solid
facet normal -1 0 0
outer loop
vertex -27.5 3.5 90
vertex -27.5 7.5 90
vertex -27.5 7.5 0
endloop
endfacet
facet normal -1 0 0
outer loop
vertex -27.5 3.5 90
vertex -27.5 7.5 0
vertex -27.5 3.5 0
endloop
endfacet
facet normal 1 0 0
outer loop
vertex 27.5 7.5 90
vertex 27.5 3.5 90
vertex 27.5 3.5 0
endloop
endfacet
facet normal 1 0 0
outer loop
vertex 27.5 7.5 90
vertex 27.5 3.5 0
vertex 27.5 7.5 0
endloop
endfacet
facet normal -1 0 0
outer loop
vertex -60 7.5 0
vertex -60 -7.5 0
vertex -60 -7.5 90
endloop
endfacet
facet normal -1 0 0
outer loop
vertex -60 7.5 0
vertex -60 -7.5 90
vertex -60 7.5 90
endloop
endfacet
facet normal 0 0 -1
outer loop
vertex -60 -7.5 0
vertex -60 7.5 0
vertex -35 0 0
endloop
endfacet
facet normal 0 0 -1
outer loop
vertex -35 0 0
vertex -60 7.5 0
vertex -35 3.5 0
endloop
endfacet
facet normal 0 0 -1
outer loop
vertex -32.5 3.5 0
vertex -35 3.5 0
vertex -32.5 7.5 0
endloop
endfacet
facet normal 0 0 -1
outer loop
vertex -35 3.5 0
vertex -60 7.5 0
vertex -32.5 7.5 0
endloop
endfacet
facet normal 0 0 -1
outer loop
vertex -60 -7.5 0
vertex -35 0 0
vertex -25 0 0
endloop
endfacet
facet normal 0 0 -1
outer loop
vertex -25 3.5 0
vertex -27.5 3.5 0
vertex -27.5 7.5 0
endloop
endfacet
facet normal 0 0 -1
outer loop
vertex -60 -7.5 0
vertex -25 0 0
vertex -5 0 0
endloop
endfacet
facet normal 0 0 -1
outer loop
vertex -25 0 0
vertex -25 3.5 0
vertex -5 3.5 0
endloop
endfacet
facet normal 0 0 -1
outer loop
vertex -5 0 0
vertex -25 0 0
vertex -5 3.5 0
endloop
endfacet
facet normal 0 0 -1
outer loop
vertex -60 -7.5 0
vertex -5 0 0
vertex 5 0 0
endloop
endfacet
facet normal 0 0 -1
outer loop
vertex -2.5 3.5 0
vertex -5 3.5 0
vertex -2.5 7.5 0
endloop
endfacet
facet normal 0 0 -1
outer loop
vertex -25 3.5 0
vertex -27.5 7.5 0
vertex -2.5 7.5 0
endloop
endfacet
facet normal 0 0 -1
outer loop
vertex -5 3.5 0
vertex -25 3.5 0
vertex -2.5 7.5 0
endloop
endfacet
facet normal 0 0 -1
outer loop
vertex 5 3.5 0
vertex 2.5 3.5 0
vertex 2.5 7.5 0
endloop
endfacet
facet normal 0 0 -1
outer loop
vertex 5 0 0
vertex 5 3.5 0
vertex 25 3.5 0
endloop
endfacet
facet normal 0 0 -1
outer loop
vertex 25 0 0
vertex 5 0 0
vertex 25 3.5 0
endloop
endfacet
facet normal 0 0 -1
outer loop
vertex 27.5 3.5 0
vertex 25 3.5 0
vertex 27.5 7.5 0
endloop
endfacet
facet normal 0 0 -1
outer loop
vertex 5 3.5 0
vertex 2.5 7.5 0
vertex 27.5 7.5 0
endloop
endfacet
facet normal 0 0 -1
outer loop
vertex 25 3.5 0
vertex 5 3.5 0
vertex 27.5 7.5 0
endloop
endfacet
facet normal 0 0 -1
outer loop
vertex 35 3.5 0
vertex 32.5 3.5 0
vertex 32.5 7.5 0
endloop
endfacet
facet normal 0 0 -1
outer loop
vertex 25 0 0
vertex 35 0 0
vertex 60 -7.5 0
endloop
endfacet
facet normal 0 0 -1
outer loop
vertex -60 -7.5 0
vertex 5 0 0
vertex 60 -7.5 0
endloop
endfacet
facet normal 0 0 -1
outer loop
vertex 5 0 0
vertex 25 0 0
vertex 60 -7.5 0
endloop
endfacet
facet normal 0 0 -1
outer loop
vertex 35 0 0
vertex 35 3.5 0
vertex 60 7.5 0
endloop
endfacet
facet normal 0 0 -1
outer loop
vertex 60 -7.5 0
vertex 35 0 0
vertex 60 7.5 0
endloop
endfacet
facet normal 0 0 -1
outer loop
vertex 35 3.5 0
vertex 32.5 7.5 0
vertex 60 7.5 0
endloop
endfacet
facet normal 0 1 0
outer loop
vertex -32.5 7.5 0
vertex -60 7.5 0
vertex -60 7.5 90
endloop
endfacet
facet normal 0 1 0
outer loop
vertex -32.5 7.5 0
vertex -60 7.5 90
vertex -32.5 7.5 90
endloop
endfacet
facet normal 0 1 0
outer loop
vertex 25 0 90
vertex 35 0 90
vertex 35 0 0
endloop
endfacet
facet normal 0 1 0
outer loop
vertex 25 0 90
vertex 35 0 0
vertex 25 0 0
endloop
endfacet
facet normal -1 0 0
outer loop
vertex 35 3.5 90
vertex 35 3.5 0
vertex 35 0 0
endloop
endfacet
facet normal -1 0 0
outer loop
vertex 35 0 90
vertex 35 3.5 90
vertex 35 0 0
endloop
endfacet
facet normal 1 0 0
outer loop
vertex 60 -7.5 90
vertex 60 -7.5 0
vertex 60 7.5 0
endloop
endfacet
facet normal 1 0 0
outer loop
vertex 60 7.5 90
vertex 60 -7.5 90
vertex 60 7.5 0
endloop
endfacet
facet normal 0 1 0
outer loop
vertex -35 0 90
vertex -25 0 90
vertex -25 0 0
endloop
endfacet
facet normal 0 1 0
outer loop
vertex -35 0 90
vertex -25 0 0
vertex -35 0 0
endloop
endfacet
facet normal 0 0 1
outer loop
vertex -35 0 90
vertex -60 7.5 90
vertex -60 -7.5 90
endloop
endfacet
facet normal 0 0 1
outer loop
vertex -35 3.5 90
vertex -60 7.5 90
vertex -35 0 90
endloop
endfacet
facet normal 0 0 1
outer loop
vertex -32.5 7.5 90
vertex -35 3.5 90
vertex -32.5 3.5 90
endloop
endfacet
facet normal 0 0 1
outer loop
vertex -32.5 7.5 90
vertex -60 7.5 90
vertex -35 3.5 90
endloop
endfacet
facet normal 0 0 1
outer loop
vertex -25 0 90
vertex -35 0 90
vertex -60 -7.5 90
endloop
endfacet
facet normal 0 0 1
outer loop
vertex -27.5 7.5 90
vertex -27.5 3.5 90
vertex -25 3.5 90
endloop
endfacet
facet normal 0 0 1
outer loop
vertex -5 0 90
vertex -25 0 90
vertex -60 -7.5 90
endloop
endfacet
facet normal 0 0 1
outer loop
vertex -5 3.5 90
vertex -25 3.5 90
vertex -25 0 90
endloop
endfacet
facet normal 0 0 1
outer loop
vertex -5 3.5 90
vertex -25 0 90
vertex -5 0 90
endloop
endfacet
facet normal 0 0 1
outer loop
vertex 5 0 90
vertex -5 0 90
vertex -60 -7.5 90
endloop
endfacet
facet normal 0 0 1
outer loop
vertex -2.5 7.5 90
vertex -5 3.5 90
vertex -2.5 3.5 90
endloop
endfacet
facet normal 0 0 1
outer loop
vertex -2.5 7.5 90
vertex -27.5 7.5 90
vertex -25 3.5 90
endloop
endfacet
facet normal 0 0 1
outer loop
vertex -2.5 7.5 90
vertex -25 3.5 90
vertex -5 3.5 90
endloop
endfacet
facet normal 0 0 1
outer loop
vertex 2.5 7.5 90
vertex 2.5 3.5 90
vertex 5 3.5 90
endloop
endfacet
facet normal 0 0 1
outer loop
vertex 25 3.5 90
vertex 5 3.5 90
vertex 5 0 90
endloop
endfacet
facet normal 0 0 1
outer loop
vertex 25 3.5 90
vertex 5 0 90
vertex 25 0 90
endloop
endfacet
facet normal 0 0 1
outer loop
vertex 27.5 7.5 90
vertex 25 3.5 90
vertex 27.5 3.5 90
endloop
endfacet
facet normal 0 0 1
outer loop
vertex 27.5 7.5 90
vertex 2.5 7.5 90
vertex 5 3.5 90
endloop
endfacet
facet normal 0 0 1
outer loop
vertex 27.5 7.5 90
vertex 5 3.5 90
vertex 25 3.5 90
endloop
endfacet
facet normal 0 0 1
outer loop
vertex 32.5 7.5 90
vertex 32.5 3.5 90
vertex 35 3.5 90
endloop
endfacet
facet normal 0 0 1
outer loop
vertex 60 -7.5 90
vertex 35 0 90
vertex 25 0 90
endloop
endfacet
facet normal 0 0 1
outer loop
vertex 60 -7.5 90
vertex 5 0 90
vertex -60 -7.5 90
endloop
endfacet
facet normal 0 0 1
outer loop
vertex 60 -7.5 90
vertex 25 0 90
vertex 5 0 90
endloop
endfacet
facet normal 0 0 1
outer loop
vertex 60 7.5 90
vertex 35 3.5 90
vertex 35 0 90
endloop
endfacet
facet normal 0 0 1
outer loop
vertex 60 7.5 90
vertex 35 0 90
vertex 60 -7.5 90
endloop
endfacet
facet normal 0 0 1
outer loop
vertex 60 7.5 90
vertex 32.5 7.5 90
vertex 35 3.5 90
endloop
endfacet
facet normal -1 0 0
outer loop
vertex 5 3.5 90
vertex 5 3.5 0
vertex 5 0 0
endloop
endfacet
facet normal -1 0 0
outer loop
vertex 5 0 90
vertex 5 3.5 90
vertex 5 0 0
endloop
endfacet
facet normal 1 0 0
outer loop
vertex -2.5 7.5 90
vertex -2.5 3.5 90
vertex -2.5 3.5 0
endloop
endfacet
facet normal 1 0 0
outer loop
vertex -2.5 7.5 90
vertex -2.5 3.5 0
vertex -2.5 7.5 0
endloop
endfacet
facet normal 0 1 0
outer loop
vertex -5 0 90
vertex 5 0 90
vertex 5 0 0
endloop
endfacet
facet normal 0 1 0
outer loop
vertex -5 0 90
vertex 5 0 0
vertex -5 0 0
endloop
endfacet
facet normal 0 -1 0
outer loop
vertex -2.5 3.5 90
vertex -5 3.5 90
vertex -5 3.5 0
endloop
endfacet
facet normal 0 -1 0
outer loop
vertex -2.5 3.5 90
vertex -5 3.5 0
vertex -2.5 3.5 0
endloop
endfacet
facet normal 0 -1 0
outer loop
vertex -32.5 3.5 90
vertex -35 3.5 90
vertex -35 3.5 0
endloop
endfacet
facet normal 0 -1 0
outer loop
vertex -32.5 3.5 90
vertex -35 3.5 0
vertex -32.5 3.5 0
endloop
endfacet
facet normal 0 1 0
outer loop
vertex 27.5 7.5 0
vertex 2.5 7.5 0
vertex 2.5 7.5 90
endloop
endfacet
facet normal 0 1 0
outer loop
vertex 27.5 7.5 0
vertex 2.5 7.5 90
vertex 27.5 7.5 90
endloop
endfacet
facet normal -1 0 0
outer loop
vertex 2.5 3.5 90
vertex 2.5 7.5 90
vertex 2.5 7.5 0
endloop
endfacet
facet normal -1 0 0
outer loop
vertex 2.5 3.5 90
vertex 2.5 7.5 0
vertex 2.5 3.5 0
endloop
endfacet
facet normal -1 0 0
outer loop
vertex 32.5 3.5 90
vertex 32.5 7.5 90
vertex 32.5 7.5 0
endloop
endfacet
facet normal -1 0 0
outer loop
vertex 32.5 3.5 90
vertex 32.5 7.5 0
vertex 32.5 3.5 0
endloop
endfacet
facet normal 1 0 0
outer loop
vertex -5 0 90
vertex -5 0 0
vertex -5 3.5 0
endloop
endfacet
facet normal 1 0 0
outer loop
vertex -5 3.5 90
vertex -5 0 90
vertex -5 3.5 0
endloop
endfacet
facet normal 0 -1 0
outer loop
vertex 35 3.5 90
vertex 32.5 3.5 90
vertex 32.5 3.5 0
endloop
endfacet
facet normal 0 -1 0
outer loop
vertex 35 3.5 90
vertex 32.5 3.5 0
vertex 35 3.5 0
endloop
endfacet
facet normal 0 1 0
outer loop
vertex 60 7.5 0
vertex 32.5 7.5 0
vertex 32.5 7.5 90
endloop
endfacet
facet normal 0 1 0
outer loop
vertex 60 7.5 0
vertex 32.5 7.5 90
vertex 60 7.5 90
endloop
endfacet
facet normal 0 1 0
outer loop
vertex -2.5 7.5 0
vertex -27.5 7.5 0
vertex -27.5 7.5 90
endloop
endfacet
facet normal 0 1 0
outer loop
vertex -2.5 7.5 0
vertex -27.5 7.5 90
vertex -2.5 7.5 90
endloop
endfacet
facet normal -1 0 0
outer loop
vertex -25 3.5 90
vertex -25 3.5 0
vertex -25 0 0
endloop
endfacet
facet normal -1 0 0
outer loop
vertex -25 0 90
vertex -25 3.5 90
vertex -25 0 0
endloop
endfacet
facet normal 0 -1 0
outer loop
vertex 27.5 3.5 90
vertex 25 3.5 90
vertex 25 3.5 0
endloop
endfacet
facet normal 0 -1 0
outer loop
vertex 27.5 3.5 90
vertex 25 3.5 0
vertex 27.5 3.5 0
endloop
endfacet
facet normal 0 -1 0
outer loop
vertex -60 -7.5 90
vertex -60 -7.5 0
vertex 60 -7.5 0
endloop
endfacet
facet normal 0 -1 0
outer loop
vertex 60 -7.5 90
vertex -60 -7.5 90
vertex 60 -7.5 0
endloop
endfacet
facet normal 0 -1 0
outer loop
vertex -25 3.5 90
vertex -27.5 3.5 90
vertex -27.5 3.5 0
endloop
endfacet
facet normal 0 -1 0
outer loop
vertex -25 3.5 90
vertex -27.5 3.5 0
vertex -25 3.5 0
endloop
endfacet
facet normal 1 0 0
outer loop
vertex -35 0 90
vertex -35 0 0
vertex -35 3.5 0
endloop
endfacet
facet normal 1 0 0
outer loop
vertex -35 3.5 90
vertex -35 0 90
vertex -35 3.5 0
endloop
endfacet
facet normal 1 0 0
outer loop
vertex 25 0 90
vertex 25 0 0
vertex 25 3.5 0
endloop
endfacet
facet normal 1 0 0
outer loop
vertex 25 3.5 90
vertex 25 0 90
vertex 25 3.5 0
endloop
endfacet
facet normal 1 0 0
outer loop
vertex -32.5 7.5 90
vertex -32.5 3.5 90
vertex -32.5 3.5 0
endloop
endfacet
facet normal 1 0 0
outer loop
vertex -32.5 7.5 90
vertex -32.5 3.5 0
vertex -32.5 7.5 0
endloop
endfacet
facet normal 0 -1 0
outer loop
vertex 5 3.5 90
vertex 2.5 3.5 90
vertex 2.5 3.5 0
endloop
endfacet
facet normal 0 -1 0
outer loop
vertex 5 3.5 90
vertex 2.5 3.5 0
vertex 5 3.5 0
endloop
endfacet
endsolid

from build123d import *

# Parameters (mm, degrees)
SKETCH3_W           = 120
SKETCH3_H           = 15
BOSS_EXTRUDE2_DEPTH = 90
CUT_EXTRUDE1_DEPTH  = 90


with BuildPart() as part:
    # Sketch3 → Boss-Extrude2 (new body)
    with BuildSketch(Plane.XY):
        Rectangle(SKETCH3_W, SKETCH3_H)
    extrude(amount=BOSS_EXTRUDE2_DEPTH)

    # Sketch6 → Cut-Extrude1 (cut)
    with BuildSketch(Plane.XY.offset(90)):
        Polygon((32.5, 3.5), (35, 3.5), (35, 0), (25, 0), (25, 3.5), (27.5, 3.5), (27.5, 7.5), (32.5, 7.5), align=None)
        Polygon((-27.5, 3.5), (-25, 3.5), (-25, 0), (-35, 0), (-35, 3.5), (-32.5, 3.5), (-32.5, 7.5), (-27.5, 7.5), align=None)
        Polygon((-2.5, 7.5), (2.5, 7.5), (2.5, 3.5), (5, 3.5), (5, 0), (-5, 0), (-5, 3.5), (-2.5, 3.5), align=None)
    extrude(amount=-CUT_EXTRUDE1_DEPTH, mode=Mode.SUBTRACT)


solid = part.part
